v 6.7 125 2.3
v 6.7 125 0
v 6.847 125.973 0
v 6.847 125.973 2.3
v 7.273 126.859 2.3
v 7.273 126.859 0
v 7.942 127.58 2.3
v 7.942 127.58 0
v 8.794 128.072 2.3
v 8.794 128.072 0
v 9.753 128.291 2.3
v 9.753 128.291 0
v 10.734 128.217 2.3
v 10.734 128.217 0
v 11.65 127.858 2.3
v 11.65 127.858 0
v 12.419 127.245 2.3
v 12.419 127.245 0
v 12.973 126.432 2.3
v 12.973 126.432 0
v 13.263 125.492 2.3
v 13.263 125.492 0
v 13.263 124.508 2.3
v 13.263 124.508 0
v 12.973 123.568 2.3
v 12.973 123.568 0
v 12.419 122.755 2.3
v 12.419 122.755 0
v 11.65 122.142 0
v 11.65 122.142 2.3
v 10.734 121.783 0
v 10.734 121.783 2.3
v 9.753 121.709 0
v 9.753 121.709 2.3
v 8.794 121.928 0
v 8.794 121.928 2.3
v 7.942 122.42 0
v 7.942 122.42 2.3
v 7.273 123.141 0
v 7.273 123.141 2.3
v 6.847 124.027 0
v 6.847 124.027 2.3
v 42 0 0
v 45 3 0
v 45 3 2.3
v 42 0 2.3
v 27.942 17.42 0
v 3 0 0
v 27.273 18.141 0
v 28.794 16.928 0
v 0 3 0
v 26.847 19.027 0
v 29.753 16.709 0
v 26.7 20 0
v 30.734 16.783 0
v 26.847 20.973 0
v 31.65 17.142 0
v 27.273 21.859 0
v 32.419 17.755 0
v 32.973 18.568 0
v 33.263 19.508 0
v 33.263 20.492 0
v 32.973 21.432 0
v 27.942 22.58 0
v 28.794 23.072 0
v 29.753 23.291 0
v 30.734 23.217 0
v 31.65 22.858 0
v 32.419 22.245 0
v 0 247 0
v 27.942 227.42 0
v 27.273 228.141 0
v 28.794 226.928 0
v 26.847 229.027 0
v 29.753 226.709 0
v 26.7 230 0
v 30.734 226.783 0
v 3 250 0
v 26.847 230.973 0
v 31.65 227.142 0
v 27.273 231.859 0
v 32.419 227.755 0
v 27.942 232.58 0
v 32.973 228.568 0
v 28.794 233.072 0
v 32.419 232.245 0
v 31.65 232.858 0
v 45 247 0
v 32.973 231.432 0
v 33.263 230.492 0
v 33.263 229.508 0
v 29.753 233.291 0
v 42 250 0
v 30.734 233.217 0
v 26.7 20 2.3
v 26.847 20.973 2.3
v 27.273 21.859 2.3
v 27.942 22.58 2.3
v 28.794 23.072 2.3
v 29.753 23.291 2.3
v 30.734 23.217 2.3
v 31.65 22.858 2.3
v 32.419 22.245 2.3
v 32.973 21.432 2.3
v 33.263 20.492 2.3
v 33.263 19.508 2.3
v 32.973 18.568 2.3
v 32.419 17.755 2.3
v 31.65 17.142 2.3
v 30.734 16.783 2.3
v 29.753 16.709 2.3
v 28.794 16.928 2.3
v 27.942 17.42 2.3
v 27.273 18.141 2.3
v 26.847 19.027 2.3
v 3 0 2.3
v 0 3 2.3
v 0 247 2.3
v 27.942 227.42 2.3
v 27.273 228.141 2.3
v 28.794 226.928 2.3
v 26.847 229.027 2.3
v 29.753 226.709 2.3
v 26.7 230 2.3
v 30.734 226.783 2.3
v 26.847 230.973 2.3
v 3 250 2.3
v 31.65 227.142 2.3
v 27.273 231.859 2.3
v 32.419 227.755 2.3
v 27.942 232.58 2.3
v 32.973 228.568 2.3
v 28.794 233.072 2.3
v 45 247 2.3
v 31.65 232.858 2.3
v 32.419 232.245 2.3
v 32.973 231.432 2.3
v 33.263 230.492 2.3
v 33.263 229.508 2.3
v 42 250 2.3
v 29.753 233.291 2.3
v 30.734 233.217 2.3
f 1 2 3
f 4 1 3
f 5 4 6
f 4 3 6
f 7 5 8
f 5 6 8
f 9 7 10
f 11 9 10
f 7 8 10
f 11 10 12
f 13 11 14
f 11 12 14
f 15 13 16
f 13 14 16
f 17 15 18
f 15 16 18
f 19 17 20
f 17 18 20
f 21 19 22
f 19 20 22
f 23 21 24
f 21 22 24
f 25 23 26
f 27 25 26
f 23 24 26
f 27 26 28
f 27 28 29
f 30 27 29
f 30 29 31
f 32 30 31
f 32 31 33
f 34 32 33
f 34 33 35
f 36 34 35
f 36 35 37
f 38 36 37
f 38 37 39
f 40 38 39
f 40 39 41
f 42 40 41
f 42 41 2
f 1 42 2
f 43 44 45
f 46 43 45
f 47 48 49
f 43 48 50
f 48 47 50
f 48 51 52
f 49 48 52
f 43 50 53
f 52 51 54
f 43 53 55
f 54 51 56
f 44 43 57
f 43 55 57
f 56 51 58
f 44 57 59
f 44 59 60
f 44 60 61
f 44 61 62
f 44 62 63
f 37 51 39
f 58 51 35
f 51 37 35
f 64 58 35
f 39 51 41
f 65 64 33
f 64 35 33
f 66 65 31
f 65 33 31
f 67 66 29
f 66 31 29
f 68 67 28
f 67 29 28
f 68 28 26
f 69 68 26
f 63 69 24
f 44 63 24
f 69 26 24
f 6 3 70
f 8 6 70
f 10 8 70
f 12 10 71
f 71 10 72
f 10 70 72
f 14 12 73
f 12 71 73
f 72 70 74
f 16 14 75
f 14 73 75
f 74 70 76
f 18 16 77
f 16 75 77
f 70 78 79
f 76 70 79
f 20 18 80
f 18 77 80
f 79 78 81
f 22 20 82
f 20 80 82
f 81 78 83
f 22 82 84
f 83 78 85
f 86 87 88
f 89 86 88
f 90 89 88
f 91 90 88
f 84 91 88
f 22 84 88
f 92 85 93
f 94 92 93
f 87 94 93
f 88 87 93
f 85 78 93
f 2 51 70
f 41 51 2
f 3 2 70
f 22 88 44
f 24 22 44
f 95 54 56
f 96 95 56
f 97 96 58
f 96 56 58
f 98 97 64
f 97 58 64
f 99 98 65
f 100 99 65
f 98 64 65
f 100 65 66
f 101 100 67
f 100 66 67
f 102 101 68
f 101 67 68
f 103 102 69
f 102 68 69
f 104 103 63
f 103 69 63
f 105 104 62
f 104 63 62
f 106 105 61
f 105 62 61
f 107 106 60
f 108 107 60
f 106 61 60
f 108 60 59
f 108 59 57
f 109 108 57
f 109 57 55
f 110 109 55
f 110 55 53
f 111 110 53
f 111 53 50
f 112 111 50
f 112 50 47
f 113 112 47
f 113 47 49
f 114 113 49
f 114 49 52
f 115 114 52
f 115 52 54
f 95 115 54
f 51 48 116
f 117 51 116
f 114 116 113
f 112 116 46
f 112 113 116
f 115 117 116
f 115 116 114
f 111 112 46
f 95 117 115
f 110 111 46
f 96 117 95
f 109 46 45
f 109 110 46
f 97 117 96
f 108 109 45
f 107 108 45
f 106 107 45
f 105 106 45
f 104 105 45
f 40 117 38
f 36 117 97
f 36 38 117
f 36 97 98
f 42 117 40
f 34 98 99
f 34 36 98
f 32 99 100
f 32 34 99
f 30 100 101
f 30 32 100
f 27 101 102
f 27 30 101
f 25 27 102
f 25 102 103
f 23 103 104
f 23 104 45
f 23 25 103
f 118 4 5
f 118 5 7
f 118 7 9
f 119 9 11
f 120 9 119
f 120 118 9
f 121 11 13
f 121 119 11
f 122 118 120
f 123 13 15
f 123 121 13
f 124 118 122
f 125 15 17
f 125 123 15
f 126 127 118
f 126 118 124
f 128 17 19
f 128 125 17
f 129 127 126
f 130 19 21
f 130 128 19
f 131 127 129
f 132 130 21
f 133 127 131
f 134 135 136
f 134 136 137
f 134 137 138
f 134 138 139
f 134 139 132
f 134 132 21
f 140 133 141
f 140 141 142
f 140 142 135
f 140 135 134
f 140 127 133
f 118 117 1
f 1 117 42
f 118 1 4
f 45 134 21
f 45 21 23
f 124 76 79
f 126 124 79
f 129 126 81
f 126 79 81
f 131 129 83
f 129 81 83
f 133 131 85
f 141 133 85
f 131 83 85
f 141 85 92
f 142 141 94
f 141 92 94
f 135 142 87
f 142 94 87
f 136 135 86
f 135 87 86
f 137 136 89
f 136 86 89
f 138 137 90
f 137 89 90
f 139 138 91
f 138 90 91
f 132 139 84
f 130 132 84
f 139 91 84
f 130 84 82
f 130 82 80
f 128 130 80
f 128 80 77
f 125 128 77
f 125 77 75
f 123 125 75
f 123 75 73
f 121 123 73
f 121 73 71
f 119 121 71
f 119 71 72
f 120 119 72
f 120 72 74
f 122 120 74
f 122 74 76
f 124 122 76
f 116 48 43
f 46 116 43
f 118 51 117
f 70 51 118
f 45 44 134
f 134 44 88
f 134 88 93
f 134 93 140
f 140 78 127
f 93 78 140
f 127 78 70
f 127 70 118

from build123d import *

# Parameters (mm, degrees)
F0_W     = 45
F0_H     = 250
F1_DEPTH = 2.3
F3_D     = 6.6
F4_SIZE  = 3


with BuildPart() as f1:
    # F0 (on Top) → F1 (new body)
    with BuildSketch(Plane.XY):
        with Locations((22.5, 125)):
            Rectangle(F0_W, F0_H)
    extrude(amount=F1_DEPTH)

    # F3 (through all)
    with Locations(Plane.XY.offset(2.3)):
        with Locations((30, 230), (10, 125), (30, 20)):
            Hole(F3_D / 2)

    # F4
    f4_edges = [f1.edges().sort_by_distance(p)[0] for p in [
        (0, 250, 1.15),
        (45, 250, 1.15),
        (0, 0, 1.15),
        (45, 0, 1.15),
    ]]
    chamfer(f4_edges, length=F4_SIZE)


solid = f1.part
